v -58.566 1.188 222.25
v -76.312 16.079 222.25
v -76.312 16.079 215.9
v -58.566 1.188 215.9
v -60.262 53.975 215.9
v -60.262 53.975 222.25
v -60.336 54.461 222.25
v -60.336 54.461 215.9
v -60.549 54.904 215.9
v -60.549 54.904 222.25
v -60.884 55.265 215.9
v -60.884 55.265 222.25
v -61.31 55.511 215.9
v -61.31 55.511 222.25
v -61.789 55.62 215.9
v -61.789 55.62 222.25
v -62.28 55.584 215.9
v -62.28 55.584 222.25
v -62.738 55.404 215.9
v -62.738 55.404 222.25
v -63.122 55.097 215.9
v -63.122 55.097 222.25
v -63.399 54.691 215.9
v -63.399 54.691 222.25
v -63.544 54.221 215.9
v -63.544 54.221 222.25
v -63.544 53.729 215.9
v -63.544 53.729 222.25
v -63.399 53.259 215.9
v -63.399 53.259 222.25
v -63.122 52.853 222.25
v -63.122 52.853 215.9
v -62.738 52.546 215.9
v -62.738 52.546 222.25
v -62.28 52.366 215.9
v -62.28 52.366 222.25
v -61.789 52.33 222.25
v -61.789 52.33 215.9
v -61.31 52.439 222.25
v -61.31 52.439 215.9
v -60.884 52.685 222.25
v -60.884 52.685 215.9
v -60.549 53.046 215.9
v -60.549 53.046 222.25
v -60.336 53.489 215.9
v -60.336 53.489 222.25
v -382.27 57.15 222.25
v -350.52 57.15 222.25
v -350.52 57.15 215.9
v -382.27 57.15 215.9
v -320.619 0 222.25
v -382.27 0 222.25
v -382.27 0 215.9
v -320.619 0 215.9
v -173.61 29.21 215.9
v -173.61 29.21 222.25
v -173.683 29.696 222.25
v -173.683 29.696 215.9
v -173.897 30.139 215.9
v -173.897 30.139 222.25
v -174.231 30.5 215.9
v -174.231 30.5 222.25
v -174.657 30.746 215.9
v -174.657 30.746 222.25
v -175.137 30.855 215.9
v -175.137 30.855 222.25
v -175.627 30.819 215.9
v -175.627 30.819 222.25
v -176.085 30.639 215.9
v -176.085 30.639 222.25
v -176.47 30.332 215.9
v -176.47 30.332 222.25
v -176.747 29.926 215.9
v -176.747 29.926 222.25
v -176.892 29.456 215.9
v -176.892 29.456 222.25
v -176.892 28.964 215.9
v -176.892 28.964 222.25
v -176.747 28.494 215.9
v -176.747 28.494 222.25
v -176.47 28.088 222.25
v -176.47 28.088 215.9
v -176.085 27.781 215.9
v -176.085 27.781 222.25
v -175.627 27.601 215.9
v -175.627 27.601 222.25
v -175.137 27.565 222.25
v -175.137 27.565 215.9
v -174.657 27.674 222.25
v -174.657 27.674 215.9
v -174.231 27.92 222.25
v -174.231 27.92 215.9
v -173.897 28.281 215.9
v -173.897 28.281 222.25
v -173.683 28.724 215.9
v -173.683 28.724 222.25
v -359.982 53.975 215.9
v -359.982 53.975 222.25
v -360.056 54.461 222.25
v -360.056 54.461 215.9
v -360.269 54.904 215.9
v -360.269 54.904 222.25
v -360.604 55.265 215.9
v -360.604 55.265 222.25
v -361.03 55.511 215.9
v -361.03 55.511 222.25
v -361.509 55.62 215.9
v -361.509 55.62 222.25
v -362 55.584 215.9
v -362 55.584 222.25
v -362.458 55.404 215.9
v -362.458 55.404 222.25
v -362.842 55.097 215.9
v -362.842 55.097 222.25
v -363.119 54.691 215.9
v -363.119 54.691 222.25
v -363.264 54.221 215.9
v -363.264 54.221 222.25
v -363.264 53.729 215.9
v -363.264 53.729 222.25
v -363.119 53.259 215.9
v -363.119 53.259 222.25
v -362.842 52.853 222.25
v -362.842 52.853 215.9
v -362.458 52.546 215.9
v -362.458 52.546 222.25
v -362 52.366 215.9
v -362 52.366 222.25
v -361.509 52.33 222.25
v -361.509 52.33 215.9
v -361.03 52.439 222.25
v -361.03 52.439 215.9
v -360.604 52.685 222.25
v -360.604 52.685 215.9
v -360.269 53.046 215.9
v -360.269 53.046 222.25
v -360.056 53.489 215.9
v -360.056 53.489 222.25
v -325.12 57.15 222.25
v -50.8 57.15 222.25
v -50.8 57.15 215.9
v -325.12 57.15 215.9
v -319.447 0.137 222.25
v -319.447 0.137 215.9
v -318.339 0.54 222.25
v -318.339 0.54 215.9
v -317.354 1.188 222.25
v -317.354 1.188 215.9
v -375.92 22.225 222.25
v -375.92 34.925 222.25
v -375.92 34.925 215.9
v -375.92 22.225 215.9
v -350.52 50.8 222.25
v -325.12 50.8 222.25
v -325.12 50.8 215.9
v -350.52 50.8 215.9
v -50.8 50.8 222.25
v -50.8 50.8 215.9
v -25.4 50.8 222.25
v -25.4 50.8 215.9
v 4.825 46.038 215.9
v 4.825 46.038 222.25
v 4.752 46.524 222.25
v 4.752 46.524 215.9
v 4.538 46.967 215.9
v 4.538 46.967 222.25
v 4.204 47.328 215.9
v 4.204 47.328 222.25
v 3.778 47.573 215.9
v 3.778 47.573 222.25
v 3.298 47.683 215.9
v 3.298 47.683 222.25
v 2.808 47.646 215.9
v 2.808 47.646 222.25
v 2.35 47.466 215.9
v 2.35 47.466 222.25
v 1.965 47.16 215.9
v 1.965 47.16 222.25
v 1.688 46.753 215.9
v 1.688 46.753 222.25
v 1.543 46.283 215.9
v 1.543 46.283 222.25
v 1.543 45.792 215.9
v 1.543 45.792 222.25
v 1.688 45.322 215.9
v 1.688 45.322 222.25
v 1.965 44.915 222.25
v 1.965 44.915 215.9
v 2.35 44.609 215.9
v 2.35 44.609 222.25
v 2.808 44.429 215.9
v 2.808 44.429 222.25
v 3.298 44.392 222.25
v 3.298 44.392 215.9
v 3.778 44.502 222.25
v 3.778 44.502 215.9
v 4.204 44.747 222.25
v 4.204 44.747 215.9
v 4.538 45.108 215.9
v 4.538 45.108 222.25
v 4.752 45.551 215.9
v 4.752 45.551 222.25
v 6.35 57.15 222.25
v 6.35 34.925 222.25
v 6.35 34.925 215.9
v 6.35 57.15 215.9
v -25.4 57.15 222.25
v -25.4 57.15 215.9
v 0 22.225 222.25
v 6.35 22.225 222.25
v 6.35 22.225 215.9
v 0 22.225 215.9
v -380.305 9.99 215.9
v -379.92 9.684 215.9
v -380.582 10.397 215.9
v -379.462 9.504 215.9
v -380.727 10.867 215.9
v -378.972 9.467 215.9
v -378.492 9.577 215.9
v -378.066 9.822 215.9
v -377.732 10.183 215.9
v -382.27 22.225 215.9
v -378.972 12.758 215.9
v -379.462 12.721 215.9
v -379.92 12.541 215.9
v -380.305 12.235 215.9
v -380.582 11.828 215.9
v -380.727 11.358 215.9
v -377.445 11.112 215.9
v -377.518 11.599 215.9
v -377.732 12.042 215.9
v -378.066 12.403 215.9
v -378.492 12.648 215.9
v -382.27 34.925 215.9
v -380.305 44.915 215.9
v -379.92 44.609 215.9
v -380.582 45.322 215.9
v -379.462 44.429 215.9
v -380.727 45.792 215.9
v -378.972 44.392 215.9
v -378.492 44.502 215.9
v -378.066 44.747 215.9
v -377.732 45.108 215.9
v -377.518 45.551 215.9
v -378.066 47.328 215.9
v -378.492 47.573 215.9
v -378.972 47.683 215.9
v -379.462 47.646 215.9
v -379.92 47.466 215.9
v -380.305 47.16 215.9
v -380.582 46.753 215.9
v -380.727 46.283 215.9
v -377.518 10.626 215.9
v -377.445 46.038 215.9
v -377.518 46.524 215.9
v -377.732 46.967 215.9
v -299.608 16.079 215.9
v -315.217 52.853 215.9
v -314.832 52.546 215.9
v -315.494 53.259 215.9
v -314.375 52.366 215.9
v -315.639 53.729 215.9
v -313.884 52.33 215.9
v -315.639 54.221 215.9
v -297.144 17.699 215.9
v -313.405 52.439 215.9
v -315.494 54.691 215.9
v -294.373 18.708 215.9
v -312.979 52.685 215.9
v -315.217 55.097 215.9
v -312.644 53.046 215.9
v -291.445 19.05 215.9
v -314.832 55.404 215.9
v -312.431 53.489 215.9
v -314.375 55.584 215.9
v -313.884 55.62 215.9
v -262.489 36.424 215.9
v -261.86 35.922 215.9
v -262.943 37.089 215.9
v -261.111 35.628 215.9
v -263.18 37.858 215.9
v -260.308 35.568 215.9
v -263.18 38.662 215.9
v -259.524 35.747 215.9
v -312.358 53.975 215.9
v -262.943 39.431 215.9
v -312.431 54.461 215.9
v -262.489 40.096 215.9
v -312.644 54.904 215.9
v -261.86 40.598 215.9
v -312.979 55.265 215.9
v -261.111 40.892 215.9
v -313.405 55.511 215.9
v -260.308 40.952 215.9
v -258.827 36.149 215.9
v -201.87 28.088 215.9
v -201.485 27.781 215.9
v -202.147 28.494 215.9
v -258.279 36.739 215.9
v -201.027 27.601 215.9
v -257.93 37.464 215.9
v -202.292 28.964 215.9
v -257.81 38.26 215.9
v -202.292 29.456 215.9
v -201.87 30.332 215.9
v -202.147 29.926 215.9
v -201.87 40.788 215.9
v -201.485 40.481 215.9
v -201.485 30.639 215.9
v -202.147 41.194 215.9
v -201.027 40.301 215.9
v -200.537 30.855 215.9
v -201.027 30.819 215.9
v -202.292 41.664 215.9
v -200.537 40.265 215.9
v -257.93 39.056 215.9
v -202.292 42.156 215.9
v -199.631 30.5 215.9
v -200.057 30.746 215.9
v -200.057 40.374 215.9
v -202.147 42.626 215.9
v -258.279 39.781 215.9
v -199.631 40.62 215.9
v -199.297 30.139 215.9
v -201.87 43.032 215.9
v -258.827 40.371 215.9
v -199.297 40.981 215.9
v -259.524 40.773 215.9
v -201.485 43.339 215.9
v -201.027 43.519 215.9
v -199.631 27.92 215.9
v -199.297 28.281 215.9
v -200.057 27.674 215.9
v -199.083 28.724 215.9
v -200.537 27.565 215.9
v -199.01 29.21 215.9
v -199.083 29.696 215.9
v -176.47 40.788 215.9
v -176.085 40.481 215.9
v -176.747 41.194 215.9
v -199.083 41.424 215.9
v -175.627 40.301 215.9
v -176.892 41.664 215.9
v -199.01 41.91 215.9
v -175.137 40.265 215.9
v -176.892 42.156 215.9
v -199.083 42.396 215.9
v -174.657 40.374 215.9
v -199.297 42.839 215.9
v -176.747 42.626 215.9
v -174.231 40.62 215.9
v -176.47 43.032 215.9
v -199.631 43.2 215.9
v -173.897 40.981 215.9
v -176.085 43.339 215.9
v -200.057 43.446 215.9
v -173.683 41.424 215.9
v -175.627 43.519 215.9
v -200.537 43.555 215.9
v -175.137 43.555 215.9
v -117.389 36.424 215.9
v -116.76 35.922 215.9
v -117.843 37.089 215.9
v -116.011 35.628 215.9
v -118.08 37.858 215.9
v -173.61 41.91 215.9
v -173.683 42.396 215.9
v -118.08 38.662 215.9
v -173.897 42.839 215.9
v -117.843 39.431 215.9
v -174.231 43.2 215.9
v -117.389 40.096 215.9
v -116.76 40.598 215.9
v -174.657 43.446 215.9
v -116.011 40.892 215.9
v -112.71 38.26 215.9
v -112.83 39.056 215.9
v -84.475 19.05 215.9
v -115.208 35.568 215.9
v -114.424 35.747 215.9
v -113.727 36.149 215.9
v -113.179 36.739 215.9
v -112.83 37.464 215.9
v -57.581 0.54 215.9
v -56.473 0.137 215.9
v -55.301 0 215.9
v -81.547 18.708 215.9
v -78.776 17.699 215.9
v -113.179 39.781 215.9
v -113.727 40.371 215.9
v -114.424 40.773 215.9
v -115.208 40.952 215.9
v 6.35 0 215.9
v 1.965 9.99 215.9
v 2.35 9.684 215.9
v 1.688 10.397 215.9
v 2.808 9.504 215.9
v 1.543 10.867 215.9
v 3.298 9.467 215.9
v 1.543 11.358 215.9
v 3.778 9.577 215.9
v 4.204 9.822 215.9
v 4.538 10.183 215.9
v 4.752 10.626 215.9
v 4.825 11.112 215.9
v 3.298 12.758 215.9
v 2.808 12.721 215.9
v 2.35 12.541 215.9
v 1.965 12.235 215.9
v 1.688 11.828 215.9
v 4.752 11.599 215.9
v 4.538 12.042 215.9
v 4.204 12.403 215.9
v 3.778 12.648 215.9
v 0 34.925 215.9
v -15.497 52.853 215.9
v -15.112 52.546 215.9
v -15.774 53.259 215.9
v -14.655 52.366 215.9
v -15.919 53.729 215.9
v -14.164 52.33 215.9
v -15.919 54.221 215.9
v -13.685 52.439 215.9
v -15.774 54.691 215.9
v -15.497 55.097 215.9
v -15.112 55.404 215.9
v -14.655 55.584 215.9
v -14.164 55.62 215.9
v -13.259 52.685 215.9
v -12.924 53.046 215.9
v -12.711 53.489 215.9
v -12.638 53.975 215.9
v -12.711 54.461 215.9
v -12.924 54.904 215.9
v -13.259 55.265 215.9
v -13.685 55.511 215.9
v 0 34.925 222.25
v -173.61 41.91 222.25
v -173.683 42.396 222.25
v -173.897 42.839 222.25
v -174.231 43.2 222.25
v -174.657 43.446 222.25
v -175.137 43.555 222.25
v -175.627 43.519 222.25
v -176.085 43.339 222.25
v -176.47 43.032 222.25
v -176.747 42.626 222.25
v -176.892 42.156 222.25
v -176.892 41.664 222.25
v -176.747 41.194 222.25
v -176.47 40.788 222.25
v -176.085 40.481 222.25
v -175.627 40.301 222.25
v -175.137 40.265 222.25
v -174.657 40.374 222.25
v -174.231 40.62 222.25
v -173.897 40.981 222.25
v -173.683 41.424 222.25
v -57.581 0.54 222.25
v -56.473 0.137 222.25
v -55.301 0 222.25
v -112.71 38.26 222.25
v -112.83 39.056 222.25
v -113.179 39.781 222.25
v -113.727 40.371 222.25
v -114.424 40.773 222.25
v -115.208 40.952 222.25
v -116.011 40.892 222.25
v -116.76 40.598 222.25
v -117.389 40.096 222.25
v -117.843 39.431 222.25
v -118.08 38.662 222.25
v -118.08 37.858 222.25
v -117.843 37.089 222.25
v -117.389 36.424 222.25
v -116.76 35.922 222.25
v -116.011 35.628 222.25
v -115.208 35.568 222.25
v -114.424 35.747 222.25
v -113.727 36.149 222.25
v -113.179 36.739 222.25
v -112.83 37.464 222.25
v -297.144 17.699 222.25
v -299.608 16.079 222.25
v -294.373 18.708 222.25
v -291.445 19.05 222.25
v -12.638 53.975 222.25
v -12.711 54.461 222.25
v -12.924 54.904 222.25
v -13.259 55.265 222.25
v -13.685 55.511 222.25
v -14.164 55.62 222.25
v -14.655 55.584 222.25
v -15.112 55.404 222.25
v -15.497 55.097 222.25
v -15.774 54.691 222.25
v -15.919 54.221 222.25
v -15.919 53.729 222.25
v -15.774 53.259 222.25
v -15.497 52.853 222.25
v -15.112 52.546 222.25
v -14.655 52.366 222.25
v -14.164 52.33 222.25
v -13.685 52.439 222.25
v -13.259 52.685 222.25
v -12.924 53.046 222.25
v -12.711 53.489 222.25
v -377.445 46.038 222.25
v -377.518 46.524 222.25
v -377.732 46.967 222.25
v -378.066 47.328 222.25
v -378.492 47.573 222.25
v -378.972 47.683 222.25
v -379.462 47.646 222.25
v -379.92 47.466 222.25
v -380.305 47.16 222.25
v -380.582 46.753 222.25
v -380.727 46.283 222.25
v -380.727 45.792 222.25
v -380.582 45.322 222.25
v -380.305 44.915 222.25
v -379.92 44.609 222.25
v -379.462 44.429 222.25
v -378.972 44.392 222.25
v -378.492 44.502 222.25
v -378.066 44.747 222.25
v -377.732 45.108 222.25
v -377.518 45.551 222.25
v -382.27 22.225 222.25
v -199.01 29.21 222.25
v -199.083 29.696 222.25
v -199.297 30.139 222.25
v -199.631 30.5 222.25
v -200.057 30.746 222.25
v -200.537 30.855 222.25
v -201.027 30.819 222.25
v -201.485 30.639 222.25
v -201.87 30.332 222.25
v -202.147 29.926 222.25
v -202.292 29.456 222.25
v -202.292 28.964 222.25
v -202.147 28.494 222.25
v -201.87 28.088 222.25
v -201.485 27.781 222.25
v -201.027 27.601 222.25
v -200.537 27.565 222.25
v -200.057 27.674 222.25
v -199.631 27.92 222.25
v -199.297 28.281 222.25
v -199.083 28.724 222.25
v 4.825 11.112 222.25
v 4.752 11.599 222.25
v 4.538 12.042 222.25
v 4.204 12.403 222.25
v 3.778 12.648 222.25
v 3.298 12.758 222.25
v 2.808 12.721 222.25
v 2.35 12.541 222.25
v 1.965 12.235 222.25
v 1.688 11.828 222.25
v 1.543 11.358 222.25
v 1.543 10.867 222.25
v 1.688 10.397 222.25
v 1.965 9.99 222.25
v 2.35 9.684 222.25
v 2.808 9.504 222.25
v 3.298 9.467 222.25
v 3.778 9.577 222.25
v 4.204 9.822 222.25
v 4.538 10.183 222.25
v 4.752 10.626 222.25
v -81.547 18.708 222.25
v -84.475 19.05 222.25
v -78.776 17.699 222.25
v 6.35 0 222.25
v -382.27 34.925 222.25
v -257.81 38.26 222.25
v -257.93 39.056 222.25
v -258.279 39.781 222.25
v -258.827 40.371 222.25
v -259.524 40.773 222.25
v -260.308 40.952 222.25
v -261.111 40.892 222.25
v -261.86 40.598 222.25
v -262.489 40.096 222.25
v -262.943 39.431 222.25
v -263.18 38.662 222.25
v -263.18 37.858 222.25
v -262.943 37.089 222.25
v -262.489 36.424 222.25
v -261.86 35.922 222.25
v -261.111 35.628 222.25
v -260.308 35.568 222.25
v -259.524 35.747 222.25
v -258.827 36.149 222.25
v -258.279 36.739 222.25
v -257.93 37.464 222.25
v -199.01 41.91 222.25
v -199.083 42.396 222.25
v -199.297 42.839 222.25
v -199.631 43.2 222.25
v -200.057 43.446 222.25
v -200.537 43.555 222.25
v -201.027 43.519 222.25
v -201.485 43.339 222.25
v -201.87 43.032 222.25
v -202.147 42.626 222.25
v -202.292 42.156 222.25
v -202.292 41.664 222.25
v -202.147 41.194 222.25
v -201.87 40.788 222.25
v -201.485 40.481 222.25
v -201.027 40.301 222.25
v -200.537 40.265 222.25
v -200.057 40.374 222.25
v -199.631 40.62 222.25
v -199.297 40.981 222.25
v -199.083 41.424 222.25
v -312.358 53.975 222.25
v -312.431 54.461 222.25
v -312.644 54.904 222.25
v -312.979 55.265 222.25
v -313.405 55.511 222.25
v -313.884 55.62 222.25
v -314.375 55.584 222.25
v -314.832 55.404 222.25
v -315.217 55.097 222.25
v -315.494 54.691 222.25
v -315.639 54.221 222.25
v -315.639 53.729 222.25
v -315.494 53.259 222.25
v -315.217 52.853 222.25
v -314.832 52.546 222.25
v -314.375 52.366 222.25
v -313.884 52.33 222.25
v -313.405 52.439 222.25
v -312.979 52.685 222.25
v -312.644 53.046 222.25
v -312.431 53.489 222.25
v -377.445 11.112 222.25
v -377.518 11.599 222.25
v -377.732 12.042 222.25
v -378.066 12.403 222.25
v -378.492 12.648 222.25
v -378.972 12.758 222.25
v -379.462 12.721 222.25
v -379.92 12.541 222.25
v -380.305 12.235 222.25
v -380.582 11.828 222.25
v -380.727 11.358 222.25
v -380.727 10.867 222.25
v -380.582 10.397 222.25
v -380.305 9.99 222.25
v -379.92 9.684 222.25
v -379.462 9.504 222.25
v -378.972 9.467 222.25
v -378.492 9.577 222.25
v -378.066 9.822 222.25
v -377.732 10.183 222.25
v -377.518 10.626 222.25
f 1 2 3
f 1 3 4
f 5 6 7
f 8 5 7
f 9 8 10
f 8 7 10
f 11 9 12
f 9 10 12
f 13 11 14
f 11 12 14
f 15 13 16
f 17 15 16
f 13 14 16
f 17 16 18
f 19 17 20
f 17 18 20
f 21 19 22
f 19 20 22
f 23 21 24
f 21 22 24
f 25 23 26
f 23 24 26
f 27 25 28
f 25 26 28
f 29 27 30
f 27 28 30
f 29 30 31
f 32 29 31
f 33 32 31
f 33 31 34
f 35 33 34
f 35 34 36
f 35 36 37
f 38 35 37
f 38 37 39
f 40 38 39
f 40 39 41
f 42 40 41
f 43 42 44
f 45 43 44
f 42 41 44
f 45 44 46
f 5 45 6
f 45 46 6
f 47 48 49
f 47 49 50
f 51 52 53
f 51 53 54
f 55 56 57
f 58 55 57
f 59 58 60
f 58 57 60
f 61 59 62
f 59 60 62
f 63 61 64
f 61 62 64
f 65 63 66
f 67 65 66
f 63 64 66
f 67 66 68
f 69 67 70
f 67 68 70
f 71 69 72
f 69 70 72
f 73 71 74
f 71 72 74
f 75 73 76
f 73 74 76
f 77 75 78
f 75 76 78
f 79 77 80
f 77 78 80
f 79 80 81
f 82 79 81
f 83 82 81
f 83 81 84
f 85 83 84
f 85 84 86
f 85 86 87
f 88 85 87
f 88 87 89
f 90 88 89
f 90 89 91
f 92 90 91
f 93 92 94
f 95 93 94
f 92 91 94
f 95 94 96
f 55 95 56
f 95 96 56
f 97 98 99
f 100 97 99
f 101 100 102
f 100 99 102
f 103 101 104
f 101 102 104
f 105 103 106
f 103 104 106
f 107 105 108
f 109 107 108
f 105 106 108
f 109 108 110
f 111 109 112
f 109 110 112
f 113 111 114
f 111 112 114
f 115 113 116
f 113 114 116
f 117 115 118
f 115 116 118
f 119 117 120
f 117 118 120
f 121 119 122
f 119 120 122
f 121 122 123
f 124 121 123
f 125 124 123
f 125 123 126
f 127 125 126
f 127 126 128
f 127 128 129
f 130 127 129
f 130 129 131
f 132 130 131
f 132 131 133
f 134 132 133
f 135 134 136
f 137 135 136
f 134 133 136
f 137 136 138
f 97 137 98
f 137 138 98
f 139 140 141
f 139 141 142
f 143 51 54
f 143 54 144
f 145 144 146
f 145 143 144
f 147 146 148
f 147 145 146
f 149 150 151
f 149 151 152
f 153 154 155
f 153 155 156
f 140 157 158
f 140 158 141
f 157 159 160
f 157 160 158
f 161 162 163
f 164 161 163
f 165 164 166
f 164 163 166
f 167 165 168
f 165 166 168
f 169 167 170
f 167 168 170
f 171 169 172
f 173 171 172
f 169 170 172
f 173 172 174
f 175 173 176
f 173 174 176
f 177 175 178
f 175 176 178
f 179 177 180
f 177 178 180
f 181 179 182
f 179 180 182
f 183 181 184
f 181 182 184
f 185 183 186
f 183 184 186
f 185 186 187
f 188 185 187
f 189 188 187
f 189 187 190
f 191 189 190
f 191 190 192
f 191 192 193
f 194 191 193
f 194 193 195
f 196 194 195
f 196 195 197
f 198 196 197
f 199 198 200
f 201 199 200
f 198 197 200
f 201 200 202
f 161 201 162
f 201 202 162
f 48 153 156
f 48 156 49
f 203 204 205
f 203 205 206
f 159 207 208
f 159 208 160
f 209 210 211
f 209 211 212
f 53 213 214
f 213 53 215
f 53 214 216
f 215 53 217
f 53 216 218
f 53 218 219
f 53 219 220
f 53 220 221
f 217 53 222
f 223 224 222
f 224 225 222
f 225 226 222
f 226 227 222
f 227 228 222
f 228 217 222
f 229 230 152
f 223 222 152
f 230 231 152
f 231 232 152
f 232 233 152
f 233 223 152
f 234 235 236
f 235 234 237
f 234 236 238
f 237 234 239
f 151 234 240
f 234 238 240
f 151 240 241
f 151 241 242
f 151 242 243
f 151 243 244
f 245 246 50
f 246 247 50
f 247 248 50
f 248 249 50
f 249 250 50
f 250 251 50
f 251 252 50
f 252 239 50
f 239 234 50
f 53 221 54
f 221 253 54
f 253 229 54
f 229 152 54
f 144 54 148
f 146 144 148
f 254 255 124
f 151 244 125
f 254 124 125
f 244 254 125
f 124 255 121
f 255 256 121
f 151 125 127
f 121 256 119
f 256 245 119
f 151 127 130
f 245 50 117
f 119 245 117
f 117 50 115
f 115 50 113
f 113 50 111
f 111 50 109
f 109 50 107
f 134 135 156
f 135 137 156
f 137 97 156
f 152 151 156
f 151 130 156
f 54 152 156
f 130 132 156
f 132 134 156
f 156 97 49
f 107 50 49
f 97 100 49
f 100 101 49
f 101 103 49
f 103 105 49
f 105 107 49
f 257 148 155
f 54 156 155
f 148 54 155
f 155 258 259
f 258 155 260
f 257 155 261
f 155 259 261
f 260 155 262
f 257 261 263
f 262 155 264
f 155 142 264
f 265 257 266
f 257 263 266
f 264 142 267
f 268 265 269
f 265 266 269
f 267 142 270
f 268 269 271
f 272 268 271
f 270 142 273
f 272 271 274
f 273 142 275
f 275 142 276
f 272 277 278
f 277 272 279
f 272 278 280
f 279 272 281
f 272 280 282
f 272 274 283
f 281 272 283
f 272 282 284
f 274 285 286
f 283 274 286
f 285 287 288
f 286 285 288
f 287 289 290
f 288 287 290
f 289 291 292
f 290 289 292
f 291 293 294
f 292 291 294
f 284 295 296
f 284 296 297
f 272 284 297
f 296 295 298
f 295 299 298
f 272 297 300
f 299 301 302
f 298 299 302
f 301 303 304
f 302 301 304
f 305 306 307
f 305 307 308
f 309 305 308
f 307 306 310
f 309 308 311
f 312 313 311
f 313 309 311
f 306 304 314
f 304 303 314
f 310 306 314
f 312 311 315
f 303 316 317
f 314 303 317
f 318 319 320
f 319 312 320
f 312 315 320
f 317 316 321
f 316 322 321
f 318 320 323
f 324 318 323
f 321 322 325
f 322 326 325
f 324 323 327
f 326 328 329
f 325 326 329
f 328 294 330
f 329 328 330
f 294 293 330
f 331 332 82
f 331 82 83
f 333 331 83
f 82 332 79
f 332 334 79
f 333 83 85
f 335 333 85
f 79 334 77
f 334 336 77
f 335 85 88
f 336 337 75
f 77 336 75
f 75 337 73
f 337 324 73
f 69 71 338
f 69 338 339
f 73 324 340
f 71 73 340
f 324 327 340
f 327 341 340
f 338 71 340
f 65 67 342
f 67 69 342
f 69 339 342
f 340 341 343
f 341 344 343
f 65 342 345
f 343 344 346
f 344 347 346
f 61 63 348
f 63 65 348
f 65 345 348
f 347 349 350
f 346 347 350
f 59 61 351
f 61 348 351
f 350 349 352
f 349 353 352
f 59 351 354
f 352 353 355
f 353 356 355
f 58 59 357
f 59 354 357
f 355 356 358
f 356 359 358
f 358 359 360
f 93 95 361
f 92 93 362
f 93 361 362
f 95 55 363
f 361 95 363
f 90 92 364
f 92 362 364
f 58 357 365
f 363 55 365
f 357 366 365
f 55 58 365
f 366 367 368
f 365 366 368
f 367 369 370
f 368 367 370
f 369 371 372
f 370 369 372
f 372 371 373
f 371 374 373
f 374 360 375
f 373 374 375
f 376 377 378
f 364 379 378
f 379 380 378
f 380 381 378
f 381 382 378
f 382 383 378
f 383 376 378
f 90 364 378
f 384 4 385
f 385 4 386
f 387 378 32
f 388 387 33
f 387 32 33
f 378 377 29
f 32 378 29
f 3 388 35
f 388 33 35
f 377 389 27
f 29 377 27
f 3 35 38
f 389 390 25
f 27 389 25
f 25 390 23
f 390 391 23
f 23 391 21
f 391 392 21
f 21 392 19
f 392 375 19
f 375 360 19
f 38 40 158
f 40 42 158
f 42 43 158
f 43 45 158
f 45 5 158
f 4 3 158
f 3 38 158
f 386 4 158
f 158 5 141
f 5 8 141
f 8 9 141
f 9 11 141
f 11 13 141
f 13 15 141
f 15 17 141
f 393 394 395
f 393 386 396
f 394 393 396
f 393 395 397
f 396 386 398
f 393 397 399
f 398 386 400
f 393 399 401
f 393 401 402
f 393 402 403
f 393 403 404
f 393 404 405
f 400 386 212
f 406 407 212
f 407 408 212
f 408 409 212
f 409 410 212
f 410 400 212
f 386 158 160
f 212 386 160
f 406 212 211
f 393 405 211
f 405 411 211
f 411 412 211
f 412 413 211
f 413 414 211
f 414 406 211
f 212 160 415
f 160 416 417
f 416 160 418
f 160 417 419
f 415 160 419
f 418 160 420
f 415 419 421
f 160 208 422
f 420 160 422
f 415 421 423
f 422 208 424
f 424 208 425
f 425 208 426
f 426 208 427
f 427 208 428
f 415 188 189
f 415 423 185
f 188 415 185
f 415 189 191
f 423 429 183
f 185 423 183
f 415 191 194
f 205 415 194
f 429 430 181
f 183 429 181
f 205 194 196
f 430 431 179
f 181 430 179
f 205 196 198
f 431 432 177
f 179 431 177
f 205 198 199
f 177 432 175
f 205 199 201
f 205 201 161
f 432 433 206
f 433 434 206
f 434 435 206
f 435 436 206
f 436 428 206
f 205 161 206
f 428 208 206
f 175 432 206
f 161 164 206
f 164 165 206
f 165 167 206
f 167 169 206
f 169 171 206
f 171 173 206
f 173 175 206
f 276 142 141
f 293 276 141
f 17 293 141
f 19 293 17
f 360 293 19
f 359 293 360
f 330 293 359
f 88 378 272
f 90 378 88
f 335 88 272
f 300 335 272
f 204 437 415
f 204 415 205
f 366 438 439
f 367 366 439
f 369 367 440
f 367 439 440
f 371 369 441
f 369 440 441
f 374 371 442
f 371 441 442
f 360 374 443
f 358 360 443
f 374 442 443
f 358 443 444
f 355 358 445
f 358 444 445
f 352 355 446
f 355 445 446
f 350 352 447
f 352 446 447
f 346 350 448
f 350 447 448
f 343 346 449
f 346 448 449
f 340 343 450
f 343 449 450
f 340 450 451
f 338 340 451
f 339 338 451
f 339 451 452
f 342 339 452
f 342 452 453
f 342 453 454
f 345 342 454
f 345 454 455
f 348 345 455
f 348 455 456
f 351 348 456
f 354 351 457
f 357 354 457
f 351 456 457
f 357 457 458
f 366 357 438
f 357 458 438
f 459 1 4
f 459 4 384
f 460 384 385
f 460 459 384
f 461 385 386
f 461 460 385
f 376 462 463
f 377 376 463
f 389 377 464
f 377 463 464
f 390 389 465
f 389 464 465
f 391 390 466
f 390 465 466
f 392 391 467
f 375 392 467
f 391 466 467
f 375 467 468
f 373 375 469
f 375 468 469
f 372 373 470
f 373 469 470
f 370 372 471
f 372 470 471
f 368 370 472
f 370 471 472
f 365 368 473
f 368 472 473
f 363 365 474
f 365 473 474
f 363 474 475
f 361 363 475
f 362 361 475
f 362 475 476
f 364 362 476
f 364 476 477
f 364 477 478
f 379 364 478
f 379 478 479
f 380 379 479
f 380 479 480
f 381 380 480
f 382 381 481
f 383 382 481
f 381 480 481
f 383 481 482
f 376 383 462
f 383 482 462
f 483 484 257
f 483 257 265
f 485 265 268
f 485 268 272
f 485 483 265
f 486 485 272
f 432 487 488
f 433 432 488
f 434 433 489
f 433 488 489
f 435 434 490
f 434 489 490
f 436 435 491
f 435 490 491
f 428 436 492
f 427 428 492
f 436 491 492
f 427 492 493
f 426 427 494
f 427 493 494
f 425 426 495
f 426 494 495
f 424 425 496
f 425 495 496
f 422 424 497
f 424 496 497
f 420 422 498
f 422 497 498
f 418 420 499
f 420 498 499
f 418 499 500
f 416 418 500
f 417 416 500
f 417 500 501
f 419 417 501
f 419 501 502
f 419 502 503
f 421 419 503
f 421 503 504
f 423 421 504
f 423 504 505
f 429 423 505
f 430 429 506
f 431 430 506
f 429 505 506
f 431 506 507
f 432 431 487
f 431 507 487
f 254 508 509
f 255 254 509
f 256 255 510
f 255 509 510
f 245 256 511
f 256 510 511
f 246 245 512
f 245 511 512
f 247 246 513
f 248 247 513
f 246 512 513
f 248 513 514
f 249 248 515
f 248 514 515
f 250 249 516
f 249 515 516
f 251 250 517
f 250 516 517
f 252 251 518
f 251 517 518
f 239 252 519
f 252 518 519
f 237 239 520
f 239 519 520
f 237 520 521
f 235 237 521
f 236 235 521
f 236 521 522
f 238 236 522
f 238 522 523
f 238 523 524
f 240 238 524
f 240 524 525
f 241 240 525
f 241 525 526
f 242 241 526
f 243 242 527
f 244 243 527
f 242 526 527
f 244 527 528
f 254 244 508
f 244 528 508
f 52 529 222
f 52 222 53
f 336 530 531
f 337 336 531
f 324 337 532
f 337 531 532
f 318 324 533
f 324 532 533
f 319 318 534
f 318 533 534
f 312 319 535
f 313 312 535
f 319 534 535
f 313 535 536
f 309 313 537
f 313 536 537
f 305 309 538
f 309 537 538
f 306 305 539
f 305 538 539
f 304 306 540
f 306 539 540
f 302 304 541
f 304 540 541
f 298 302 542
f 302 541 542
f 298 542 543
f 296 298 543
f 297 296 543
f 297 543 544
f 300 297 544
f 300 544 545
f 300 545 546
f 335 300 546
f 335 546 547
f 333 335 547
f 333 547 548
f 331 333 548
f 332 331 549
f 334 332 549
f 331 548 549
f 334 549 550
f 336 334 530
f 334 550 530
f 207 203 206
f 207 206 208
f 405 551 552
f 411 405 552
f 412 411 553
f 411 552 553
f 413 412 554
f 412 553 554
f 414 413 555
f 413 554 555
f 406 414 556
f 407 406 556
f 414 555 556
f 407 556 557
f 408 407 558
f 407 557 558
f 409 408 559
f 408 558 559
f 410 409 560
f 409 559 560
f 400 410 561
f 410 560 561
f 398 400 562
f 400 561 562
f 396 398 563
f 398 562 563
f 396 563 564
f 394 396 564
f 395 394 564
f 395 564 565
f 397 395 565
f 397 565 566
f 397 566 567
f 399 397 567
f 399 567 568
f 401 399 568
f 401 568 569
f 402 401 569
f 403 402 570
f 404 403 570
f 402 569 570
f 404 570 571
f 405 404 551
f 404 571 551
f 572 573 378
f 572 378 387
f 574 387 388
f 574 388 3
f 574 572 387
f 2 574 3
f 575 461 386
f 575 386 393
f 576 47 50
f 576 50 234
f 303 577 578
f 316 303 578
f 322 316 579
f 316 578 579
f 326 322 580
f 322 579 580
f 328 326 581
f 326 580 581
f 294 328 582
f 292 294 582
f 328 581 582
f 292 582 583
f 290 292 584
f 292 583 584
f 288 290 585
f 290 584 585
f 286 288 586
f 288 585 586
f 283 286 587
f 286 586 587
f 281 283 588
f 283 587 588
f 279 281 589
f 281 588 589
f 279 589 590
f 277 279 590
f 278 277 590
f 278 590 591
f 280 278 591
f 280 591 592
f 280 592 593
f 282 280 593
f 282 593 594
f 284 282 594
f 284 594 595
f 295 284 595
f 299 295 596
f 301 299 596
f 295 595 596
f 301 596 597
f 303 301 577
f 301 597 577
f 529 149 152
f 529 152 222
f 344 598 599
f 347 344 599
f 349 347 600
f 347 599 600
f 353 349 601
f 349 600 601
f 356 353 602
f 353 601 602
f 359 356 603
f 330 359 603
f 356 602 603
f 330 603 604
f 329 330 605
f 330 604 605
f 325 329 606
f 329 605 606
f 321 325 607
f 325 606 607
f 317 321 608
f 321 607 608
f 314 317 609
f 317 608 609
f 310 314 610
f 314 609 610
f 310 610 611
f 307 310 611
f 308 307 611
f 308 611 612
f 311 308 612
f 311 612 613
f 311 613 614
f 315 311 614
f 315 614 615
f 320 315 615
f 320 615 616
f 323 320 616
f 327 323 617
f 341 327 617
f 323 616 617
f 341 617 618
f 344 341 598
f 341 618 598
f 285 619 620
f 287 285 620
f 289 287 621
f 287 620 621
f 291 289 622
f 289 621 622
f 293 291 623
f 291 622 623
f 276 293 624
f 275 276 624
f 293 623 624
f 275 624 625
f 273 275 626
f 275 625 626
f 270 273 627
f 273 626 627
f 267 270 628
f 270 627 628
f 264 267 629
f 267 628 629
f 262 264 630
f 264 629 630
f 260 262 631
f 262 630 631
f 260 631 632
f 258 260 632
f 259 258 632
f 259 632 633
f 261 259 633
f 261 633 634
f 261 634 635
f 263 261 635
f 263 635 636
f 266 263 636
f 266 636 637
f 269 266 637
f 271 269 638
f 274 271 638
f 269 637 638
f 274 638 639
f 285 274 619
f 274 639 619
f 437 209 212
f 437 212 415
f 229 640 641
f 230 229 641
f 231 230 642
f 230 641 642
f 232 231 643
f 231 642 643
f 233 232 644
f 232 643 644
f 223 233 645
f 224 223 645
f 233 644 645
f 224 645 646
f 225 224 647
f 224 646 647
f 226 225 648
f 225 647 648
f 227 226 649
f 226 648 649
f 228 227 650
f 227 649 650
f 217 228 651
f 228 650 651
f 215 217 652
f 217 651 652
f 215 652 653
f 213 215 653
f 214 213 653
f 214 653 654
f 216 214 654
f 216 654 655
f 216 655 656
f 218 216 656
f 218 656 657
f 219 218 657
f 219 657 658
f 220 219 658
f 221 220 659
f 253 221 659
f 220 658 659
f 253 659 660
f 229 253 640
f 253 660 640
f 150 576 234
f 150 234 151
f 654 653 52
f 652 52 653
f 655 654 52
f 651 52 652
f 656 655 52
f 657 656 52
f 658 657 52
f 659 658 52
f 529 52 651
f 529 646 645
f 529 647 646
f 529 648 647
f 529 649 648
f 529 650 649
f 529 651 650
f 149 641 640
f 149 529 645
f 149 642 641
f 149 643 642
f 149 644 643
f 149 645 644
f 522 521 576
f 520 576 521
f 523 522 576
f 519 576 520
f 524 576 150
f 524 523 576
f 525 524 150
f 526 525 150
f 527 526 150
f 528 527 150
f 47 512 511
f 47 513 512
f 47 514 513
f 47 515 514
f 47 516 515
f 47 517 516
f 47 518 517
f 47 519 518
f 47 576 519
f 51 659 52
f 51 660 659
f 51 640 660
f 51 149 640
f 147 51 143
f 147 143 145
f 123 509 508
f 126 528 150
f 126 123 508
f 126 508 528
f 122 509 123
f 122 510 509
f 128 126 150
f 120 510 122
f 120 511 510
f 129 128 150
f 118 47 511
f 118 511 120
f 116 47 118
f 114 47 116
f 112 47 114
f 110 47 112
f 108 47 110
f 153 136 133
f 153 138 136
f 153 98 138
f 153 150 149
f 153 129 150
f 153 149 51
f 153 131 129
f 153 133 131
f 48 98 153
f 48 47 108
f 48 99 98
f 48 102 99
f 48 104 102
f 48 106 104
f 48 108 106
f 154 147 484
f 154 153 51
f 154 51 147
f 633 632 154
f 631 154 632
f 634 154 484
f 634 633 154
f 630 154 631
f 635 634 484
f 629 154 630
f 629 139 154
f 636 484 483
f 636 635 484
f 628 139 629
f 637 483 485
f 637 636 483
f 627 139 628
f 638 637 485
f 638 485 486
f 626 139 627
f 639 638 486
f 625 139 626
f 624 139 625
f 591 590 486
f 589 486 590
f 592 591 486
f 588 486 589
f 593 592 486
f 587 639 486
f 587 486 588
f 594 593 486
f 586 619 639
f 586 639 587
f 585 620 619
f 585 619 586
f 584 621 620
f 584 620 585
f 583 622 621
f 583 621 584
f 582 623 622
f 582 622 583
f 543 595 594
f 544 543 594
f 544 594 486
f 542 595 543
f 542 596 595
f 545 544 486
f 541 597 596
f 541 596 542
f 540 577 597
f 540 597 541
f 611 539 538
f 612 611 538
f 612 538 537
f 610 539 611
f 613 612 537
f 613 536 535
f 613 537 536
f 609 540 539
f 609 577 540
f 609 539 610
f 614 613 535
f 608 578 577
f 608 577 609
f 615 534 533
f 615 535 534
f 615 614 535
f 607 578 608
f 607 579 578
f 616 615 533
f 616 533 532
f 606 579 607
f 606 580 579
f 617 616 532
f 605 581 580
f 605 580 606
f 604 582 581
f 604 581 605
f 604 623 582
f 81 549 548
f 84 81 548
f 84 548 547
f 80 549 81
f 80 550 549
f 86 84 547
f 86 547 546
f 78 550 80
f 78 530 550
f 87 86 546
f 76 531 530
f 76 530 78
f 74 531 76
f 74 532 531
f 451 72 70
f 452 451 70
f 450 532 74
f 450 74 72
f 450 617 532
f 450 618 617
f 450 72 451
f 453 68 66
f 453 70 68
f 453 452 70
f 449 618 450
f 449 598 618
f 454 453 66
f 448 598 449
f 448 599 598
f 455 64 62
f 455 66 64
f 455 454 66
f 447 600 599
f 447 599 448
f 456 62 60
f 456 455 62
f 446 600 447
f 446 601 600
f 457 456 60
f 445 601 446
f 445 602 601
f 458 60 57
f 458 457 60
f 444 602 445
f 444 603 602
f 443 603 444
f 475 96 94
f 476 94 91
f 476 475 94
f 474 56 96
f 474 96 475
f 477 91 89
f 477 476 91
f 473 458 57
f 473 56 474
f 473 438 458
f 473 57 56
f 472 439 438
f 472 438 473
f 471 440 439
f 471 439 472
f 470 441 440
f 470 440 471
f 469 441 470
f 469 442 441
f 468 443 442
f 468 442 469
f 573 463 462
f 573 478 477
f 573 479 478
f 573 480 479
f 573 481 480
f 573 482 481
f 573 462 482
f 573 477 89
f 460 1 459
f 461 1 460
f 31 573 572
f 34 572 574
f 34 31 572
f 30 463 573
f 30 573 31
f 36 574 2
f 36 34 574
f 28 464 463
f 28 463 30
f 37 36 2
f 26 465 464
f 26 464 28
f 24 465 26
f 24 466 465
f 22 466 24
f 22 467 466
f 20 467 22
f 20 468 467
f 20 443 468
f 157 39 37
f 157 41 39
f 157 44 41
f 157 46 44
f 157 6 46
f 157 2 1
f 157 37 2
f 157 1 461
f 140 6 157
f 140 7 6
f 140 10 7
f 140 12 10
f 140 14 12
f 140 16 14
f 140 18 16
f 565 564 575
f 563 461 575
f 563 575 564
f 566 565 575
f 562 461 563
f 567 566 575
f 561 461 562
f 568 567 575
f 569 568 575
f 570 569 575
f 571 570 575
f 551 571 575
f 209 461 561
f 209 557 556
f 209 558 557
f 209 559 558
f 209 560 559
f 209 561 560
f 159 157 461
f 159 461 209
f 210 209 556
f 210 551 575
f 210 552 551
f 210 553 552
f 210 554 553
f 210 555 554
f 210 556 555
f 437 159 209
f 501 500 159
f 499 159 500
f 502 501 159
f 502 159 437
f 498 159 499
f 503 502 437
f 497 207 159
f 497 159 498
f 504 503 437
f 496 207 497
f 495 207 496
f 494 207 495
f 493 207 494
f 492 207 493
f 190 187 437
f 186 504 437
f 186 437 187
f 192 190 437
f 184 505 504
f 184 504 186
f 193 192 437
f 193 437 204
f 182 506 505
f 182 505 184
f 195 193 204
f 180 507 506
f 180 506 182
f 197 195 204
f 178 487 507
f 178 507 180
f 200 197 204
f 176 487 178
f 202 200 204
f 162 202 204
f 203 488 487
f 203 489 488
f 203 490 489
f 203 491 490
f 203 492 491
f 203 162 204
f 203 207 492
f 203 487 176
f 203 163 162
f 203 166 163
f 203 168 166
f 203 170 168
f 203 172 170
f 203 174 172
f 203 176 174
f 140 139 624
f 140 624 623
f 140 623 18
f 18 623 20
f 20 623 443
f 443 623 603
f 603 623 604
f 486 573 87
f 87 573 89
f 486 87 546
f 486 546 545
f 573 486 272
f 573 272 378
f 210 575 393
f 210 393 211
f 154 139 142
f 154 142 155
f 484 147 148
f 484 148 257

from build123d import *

# Parameters (mm, degrees)
SKETCH1_R           = 1.65
SKETCH1_R_2         = 2.7
BOSS_EXTRUDE1_DEPTH = 6.35


with BuildPart() as part:
    # Sketch1 → Boss-Extrude1 (new body)
    with BuildSketch(Plane.XY.offset(222.25)):
        with BuildLine():
            Line((-25.4, 57.15), (-25.4, 50.8))
            Line((-25.4, 50.8), (-50.8, 50.8))
            Line((-50.8, 50.8), (-50.8, 57.15))
            Line((-50.8, 57.15), (-325.12, 57.15))
            Line((-325.12, 57.15), (-325.12, 50.8))
            Line((-325.12, 50.8), (-350.52, 50.8))
            Line((-350.52, 50.8), (-350.52, 57.15))
            Line((-350.52, 57.15), (-382.27, 57.15))
            Line((-382.27, 57.15), (-382.27, 34.925))
            Line((-382.27, 34.925), (-375.92, 34.925))
            Line((-375.92, 34.925), (-375.92, 22.225))
            Line((-375.92, 22.225), (-382.27, 22.225))
            Line((-382.27, 22.225), (-382.27, 0))
            Line((-382.27, 0), (-320.61896879, 0))
            ThreePointArc((-320.61896879, 0), (-318.881506462, 0.306361486), (-317.353607733, 1.188494229))
            Line((-317.353607733, 1.188494229), (-299.608074729, 16.078764428))
            ThreePointArc((-299.608074729, 16.078764428), (-295.788327906, 18.284096284), (-291.444672086, 19.05))
            Line((-291.444672086, 19.05), (-84.475327914, 19.05))
            ThreePointArc((-84.475327914, 19.05), (-80.131672094, 18.284096284), (-76.311925271, 16.078764428))
            Line((-76.311925271, 16.078764428), (-58.566392267, 1.188494229))
            ThreePointArc((-58.566392267, 1.188494229), (-57.038493538, 0.306361486), (-55.30103121, 0))
            Line((-55.30103121, 0), (6.35, 0))
            Line((6.35, 0), (6.35, 22.225))
            Line((6.35, 22.225), (0, 22.225))
            Line((0, 22.225), (0, 34.925))
            Line((0, 34.925), (6.35, 34.925))
            Line((6.35, 34.925), (6.35, 57.15))
            Line((6.35, 57.15), (-25.4, 57.15))
        make_face()
        with Locations((-379.095, 11.1125)):
            Circle(SKETCH1_R, mode=Mode.SUBTRACT)
        with Locations((3.175, 11.1125)):
            Circle(SKETCH1_R, mode=Mode.SUBTRACT)
        with Locations((-379.095, 46.0375)):
            Circle(SKETCH1_R, mode=Mode.SUBTRACT)
        with Locations((3.175, 46.0375)):
            Circle(SKETCH1_R, mode=Mode.SUBTRACT)
        with Locations((-175.260005593, 41.91)):
            Circle(SKETCH1_R, mode=Mode.SUBTRACT)
        with Locations((-200.66, 41.91)):
            Circle(SKETCH1_R, mode=Mode.SUBTRACT)
        with Locations((-175.260005593, 29.21)):
            Circle(SKETCH1_R, mode=Mode.SUBTRACT)
        with Locations((-200.66, 29.21)):
            Circle(SKETCH1_R, mode=Mode.SUBTRACT)
        with Locations((-14.2875, 53.975)):
            Circle(SKETCH1_R, mode=Mode.SUBTRACT)
        with Locations((-361.6325, 53.975)):
            Circle(SKETCH1_R, mode=Mode.SUBTRACT)
        with Locations((-61.9125, 53.975)):
            Circle(SKETCH1_R, mode=Mode.SUBTRACT)
        with Locations((-314.0075, 53.975)):
            Circle(SKETCH1_R, mode=Mode.SUBTRACT)
        with Locations((-115.41, 38.26)):
            Circle(SKETCH1_R_2, mode=Mode.SUBTRACT)
        with Locations((-260.51, 38.26)):
            Circle(SKETCH1_R_2, mode=Mode.SUBTRACT)
    extrude(amount=-BOSS_EXTRUDE1_DEPTH)


solid = part.part
